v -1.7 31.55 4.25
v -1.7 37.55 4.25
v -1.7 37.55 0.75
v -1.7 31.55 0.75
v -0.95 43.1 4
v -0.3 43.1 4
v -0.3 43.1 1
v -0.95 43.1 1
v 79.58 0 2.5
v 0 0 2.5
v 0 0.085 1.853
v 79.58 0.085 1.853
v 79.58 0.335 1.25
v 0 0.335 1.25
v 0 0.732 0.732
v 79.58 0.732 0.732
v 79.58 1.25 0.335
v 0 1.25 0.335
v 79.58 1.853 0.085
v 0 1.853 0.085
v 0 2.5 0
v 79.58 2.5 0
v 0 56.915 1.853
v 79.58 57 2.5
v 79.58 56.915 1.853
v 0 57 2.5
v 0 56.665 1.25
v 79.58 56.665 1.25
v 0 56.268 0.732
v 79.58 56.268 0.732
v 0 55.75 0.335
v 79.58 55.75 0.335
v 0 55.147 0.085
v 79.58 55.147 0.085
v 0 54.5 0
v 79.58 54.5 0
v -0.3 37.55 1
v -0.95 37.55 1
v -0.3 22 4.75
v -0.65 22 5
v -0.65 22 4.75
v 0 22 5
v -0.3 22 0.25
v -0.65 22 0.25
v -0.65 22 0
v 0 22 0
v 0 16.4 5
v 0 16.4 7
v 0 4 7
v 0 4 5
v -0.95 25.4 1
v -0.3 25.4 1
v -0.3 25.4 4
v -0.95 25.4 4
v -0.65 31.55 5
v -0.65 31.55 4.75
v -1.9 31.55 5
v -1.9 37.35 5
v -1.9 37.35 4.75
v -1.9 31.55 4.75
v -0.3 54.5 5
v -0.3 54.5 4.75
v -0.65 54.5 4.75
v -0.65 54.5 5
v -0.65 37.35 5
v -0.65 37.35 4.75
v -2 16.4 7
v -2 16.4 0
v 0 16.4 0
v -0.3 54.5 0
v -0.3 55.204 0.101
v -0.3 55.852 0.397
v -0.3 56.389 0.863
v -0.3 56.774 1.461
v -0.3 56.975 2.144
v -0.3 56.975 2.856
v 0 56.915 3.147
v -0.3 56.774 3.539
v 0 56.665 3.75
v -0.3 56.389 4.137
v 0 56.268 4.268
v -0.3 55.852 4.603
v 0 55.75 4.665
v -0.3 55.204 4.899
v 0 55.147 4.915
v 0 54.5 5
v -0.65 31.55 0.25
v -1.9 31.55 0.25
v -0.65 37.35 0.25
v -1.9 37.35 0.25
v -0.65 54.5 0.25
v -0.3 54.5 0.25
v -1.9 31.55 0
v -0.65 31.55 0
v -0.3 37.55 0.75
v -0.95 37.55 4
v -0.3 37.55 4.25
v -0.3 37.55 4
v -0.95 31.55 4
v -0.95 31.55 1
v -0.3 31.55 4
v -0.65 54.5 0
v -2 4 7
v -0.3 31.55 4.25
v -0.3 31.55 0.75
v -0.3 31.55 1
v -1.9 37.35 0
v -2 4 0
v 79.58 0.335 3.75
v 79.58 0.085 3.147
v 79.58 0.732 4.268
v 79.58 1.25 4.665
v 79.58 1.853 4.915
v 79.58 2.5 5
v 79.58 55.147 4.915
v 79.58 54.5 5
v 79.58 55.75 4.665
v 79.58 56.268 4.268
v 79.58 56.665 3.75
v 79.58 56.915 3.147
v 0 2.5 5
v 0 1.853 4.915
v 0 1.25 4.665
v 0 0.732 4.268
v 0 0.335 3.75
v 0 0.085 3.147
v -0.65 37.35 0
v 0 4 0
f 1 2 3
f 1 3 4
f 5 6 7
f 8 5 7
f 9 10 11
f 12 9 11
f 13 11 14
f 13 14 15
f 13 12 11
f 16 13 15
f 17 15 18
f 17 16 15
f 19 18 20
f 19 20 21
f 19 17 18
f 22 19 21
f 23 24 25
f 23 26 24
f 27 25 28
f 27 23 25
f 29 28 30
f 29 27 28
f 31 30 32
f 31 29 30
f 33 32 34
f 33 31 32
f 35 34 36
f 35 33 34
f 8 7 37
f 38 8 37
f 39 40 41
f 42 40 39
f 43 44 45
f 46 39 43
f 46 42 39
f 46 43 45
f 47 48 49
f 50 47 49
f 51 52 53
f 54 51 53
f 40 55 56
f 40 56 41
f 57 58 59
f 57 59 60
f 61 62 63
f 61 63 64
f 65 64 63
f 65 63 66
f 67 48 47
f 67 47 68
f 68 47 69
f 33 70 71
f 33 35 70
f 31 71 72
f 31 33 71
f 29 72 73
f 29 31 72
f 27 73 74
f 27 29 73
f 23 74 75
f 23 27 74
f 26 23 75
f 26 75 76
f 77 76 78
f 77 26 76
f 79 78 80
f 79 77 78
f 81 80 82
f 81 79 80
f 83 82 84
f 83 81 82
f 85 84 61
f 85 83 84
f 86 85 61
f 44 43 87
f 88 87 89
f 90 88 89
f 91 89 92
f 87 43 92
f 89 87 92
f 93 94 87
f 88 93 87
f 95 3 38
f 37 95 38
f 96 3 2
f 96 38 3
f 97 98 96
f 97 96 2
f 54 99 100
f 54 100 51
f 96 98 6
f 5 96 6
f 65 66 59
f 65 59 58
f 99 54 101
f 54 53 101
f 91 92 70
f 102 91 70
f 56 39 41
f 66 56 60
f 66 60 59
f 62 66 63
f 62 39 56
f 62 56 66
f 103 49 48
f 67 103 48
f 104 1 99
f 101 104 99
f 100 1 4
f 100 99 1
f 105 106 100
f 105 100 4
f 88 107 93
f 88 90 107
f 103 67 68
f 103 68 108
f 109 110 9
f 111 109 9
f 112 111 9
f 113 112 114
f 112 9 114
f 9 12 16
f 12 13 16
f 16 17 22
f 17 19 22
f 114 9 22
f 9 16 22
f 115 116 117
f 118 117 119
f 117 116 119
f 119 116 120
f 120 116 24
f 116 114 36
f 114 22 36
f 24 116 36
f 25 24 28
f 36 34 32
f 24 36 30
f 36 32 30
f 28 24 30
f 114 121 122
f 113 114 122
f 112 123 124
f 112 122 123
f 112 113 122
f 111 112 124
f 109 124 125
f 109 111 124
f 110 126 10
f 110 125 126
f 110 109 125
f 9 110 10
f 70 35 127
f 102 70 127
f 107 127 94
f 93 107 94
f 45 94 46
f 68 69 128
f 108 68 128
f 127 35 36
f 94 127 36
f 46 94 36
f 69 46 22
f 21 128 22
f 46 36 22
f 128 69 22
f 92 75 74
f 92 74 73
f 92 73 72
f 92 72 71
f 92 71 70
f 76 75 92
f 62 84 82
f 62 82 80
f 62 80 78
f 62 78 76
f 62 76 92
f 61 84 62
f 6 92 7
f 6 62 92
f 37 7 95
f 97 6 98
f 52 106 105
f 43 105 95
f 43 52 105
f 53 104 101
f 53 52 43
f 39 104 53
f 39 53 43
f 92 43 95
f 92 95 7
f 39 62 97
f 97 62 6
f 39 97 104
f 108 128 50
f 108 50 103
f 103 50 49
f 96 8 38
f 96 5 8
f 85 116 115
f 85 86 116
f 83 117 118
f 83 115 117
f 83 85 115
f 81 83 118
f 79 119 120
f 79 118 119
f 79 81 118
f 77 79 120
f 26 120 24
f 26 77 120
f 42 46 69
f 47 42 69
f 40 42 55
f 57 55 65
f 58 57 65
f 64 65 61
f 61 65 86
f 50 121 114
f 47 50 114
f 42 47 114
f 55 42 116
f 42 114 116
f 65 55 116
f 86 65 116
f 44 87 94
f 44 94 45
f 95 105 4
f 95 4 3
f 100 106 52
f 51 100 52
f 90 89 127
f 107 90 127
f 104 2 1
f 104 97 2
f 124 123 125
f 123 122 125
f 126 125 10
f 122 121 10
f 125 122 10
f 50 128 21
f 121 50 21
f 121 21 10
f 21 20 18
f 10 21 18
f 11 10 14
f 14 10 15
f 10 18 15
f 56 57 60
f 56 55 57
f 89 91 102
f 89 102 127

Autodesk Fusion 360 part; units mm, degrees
sketch "Sketch1" plane through (0, 0, 0) normal (0, 0, 1) x (1, 0, 0)
  line L0 (0, 0) -> (79.58, 0)
  line L1 (79.58, 0) -> (79.58, 57)
  line L2 (79.58, 57) -> (0, 57)
  line L3 (0, 57) -> (0, 0)
  dimension "d1" = 79.58
  dimension "d2" = 57
extrude "Extrude1" add sketch "Sketch1" along normal blind 5
fillet "Fillet1" radius 2.5 4 edges at (39.79, 0, 5) (39.79, 0, 0) (39.79, 57, 5) (39.79, 57, 0)
sketch "Sketch2" plane through (0, 0, 0) normal (-1, 0, 0) x (0, -1, 0)
  arc A0 (-54.5, 5) -> (-54.5, 0) centre (-54.5, 2.5) ccw
  line L0 (-54.5, 0) -> (-2.5, 0)
  arc A1 (-2.5, 0) -> (-2.5, 5) centre (-2.5, 2.5) ccw
  line L1 (-2.5, 5) -> (-54.5, 5)
  line L2 (-54.5, 5) -> (-22, 5)
  line L3 (-22, 5) -> (-22, 0)
  line L4 (-22, 0) -> (-54.5, 0)
  arc A2 (-54.5, 5) -> (-54.5, 0) centre (-54.5, 2.5) ccw
  dimension "d7" = 5
  dimension "d8" = 32.5
extrude "Extrude2" add sketch "Sketch2" along normal blind 0.3 contours A0 L0 L1 L2 L3 L4 A2
sketch "Sketch4" plane through (-0.3, 0, 0) normal (-1, 0, 0) x (0, -1, 0)
  line L0 (-22, 5) -> (-54.5, 5)
  arc A0 (-54.5, 5) -> (-54.5, 0) centre (-54.5, 2.5) ccw
  line L1 (-54.5, 0) -> (-22, 0)
  line L2 (-22, 0) -> (-22, 5)
  line L3 (-54.5, 0) -> (-22, 0)
  line L4 (-22, 0) -> (-22, 0.25)
  line L5 (-22, 0.25) -> (-54.5, 0.25)
  line L6 (-54.5, 0.25) -> (-54.5, 0)
  line L7 (-59.156, 2.5) -> (0.7958, 2.5) construction
  line L8 (-54.5, 5) -> (-22, 5)
  line L9 (-22, 5) -> (-22, 4.75)
  line L10 (-22, 4.75) -> (-54.5, 4.75)
  line L11 (-54.5, 4.75) -> (-54.5, 5)
  dimension "d11" = 0.25
extrude "Extrude3" add sketch "Sketch4" along normal blind 0.35 contours L0 L2 L8 L9 L10 L11 | L1 L2 L3 L4 L5 L6
sketch "Sketch5" plane through (-0.65, 0, 0) normal (-1, 0, 0) x (0, -1, 0)
  line L0 (-54.5, 0) -> (-22, 0)
  line L1 (-22, 0) -> (-22, 0.25)
  line L2 (-31.55, 0.25) -> (-37.35, 0.25)
  line L3 (-37.35, 0.25) -> (-37.35, 0)
  line L4 (-37.35, 0) -> (-31.55, 0)
  line L5 (-31.55, 0) -> (-31.55, 0.25)
  line L6 (-54.5, 0.25) -> (-54.5, 0)
  line L7 (-22, 0.25) -> (-54.5, 0.25)
  line L8 (-58.264, 2.5) -> (4.0505, 2.5) construction
  line L9 (-22, 5) -> (-54.5, 5) construction
  line L10 (-31.55, 4.75) -> (-37.35, 4.75)
  line L11 (-37.35, 4.75) -> (-37.35, 5)
  line L12 (-37.35, 5) -> (-31.55, 5)
  line L13 (-31.55, 5) -> (-31.55, 4.75)
  dimension "d18" = 5.8
  dimension "d19" = 2.5
  dimension "d20" = 2.5
extrude "Extrude4" add sketch "Sketch5" along normal blind 1.25 contours L0 L2 L3 L4 L5 L7 | L10 L11 L12 L13
sketch "Sketch6" plane through (0, 0, 0) normal (-1, 0, 0) x (0, -1, 0)
  line L0 (-22, 5) -> (-22, 0)
  line L1 (-22, 0) -> (-2.5, 0)
  arc A0 (-2.5, 0) -> (-2.5, 5) centre (-2.5, 2.5) ccw
  line L2 (-2.5, 5) -> (-22, 5)
  line L3 (-4, 7) -> (-16.4, 7)
  line L4 (-16.4, 7) -> (-16.4, 0)
  line L5 (-16.4, 0) -> (-4, 0)
  line L6 (-4, 0) -> (-4, 7)
  line L7 (0, 8.6382) -> (0, -2.5126) construction
  dimension "d21" = 4
  dimension "d22" = 12.4
  dimension "d23" = 2
extrude "Extrude5" add sketch "Sketch6" along normal blind 2 contours L2 L3 L4 L6 | L1 L2 L4 L5 L6
sketch "Sketch7" plane through (-0.3, 0, 0) normal (-1, 0, 0) x (0, -1, 0)
  line L0 (-22, 4.75) -> (-54.5, 4.75)
  line L1 (-54.5, 4.75) -> (-54.5, 5)
  arc A0 (-54.5, 5) -> (-54.5, 0) centre (-54.5, 2.5) ccw
  line L2 (-54.5, 0) -> (-54.5, 0.25)
  line L3 (-54.5, 0.25) -> (-22, 0.25)
  line L4 (-22, 0.25) -> (-22, 4.75)
  line L5 (-37.55, 4.25) -> (-31.55, 4.25)
  line L6 (-31.55, 4.25) -> (-31.55, 0.75)
  line L7 (-31.55, 0.75) -> (-37.55, 0.75)
  line L8 (-37.55, 0.75) -> (-37.55, 4.25)
  line L9 (-59.3246, 2.5) -> (-29.1063, 2.5) construction
  line L10 (-31.55, 7.2978) -> (-31.55, -1.062) construction
  point P0 (-31.55, 5)
  dimension "d26" = 6
  dimension "d27" = 3.5
  dimension "d28" = 1.75
extrude "Extrude7" add sketch "Sketch7" along normal blind 1.4 contours L5 L6 L7 L8
sketch "Sketch8" plane through (-0.3, 0, 0) normal (-1, 0, 0) x (0, -1, 0)
  line L0 (-22, 4.75) -> (-54.5, 4.75)
  line L1 (-54.5, 4.75) -> (-54.5, 5)
  arc A0 (-54.5, 5) -> (-54.5, 0) centre (-54.5, 2.5) ccw
  line L2 (-54.5, 0) -> (-54.5, 0.25)
  line L3 (-54.5, 0.25) -> (-22, 0.25)
  line L4 (-22, 0.25) -> (-22, 4.75)
  line L5 (-25.4, 4) -> (-43.1, 4)
  line L6 (-43.1, 4) -> (-43.1, 1)
  line L7 (-43.1, 1) -> (-25.4, 1)
  line L8 (-25.4, 1) -> (-25.4, 4)
  line L9 (-57, 2.5) -> (-22, 2.5) construction
  line L10 (-37.55, 0.75) -> (-37.55, 4.25)
  line L11 (-37.55, 4.25) -> (-31.55, 4.25)
  line L12 (-31.55, 4.25) -> (-31.55, 0.75)
  line L13 (-31.55, 0.75) -> (-37.55, 0.75)
  dimension "d29" = 1.5
  dimension "d30" = 3
  dimension "d31" = 17.7
  dimension "d32" = 3.4
extrude "Extrude6" add sketch "Sketch8" along normal blind 0.65 contours L5 L7 L8 L12 | L5 L7 L10 L12 | L5 L6 L7 L10
equation "d8 = 35 mm - ( d7 / 2 )"
equation "d28 = d27 / 2"
equation "d29 = d30 / 2"
